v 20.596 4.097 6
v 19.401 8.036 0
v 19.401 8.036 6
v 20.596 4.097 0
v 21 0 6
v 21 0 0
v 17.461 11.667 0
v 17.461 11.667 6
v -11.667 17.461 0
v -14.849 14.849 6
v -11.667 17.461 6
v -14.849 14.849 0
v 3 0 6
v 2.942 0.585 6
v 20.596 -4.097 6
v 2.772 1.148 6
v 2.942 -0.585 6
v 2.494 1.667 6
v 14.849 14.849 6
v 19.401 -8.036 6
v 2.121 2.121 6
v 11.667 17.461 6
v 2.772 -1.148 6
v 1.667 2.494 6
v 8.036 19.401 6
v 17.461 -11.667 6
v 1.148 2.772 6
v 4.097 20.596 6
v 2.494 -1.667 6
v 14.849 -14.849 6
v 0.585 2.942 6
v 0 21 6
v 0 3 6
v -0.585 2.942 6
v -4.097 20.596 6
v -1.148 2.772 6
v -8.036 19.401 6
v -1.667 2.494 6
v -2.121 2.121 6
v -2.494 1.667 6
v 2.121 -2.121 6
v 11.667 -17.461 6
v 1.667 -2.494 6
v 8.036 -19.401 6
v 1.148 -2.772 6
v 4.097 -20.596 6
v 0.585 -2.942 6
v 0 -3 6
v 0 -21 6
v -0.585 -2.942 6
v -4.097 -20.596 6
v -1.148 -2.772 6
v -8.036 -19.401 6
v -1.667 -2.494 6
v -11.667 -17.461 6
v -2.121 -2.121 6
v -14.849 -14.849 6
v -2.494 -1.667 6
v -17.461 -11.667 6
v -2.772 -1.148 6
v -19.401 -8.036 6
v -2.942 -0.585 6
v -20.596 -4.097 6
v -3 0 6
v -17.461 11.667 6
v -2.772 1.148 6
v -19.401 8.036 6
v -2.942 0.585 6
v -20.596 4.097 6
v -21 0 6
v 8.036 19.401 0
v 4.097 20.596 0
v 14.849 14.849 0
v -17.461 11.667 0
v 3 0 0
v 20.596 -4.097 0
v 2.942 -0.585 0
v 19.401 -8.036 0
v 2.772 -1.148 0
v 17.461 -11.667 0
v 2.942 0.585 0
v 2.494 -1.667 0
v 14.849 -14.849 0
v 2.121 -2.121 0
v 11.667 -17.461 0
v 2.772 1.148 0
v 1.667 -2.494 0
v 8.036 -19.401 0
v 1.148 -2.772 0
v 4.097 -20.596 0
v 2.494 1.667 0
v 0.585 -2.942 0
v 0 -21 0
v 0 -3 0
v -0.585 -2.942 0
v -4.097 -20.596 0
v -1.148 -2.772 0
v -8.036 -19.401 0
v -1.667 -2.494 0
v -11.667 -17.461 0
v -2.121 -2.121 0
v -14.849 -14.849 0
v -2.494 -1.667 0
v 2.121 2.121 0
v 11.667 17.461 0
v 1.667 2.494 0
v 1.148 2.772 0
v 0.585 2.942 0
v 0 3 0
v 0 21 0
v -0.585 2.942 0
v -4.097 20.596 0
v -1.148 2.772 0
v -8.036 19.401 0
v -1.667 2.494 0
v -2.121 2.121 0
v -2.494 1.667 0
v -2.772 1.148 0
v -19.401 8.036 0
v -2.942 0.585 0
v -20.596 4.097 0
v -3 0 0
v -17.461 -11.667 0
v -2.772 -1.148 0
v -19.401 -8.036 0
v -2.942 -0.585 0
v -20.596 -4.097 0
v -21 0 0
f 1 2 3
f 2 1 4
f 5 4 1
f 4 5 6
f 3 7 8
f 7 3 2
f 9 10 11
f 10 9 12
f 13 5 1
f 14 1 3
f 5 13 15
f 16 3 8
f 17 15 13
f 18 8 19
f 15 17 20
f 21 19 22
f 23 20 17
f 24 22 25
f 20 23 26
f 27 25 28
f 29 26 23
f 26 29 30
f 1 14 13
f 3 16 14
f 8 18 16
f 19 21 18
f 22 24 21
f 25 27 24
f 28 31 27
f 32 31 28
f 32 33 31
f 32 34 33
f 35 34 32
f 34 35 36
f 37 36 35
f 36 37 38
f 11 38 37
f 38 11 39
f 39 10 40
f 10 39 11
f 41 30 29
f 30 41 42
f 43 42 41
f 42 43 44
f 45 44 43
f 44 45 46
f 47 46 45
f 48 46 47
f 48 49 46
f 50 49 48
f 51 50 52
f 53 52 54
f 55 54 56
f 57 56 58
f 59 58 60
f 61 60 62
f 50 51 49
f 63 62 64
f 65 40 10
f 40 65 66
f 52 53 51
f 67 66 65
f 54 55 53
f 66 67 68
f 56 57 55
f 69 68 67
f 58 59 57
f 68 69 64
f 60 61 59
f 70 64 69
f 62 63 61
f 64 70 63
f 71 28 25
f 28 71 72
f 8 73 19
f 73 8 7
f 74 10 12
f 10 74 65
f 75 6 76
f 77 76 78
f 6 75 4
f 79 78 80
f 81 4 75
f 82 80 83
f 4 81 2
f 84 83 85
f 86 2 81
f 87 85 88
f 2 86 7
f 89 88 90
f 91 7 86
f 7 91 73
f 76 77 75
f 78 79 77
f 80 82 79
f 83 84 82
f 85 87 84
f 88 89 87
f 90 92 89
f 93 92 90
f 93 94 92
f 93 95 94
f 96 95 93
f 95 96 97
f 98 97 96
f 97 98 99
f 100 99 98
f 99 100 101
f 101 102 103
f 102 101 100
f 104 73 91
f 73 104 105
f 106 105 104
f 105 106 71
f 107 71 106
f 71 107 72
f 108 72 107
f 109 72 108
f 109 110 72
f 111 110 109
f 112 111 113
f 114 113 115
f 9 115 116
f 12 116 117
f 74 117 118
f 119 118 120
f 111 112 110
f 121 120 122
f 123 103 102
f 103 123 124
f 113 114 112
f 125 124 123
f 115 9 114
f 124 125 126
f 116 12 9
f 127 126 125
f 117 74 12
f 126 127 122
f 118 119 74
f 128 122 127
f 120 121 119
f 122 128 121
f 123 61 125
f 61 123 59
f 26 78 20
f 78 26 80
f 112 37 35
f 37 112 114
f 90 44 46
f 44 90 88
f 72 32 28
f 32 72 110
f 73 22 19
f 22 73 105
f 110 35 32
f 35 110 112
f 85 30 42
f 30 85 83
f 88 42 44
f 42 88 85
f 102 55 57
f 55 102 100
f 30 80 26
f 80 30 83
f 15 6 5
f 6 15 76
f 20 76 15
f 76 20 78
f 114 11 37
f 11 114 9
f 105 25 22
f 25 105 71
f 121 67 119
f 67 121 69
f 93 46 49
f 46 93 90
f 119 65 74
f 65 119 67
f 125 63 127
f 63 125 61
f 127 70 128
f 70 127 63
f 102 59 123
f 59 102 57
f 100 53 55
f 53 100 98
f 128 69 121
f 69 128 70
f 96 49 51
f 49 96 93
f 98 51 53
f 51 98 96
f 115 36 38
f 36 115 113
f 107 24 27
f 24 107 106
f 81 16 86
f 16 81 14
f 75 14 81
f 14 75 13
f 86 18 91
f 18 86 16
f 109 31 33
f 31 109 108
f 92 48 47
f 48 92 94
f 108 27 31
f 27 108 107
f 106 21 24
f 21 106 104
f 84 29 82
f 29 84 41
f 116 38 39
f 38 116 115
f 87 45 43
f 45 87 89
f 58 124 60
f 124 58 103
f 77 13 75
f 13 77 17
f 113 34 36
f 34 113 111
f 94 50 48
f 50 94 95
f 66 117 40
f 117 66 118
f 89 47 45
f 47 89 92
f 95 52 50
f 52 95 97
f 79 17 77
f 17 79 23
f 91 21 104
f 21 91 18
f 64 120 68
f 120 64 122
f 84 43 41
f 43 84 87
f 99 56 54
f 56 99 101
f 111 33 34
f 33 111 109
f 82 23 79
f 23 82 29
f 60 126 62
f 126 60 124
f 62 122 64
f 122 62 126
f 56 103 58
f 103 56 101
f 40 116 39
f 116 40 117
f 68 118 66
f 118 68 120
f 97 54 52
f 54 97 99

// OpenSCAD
height=6;
diameter=42;
hole_diameter=6;

$fn=32;

difference(){
  cylinder(h=height,r=diameter/2);
  cylinder(h=height,r=hole_diameter/2);
}
